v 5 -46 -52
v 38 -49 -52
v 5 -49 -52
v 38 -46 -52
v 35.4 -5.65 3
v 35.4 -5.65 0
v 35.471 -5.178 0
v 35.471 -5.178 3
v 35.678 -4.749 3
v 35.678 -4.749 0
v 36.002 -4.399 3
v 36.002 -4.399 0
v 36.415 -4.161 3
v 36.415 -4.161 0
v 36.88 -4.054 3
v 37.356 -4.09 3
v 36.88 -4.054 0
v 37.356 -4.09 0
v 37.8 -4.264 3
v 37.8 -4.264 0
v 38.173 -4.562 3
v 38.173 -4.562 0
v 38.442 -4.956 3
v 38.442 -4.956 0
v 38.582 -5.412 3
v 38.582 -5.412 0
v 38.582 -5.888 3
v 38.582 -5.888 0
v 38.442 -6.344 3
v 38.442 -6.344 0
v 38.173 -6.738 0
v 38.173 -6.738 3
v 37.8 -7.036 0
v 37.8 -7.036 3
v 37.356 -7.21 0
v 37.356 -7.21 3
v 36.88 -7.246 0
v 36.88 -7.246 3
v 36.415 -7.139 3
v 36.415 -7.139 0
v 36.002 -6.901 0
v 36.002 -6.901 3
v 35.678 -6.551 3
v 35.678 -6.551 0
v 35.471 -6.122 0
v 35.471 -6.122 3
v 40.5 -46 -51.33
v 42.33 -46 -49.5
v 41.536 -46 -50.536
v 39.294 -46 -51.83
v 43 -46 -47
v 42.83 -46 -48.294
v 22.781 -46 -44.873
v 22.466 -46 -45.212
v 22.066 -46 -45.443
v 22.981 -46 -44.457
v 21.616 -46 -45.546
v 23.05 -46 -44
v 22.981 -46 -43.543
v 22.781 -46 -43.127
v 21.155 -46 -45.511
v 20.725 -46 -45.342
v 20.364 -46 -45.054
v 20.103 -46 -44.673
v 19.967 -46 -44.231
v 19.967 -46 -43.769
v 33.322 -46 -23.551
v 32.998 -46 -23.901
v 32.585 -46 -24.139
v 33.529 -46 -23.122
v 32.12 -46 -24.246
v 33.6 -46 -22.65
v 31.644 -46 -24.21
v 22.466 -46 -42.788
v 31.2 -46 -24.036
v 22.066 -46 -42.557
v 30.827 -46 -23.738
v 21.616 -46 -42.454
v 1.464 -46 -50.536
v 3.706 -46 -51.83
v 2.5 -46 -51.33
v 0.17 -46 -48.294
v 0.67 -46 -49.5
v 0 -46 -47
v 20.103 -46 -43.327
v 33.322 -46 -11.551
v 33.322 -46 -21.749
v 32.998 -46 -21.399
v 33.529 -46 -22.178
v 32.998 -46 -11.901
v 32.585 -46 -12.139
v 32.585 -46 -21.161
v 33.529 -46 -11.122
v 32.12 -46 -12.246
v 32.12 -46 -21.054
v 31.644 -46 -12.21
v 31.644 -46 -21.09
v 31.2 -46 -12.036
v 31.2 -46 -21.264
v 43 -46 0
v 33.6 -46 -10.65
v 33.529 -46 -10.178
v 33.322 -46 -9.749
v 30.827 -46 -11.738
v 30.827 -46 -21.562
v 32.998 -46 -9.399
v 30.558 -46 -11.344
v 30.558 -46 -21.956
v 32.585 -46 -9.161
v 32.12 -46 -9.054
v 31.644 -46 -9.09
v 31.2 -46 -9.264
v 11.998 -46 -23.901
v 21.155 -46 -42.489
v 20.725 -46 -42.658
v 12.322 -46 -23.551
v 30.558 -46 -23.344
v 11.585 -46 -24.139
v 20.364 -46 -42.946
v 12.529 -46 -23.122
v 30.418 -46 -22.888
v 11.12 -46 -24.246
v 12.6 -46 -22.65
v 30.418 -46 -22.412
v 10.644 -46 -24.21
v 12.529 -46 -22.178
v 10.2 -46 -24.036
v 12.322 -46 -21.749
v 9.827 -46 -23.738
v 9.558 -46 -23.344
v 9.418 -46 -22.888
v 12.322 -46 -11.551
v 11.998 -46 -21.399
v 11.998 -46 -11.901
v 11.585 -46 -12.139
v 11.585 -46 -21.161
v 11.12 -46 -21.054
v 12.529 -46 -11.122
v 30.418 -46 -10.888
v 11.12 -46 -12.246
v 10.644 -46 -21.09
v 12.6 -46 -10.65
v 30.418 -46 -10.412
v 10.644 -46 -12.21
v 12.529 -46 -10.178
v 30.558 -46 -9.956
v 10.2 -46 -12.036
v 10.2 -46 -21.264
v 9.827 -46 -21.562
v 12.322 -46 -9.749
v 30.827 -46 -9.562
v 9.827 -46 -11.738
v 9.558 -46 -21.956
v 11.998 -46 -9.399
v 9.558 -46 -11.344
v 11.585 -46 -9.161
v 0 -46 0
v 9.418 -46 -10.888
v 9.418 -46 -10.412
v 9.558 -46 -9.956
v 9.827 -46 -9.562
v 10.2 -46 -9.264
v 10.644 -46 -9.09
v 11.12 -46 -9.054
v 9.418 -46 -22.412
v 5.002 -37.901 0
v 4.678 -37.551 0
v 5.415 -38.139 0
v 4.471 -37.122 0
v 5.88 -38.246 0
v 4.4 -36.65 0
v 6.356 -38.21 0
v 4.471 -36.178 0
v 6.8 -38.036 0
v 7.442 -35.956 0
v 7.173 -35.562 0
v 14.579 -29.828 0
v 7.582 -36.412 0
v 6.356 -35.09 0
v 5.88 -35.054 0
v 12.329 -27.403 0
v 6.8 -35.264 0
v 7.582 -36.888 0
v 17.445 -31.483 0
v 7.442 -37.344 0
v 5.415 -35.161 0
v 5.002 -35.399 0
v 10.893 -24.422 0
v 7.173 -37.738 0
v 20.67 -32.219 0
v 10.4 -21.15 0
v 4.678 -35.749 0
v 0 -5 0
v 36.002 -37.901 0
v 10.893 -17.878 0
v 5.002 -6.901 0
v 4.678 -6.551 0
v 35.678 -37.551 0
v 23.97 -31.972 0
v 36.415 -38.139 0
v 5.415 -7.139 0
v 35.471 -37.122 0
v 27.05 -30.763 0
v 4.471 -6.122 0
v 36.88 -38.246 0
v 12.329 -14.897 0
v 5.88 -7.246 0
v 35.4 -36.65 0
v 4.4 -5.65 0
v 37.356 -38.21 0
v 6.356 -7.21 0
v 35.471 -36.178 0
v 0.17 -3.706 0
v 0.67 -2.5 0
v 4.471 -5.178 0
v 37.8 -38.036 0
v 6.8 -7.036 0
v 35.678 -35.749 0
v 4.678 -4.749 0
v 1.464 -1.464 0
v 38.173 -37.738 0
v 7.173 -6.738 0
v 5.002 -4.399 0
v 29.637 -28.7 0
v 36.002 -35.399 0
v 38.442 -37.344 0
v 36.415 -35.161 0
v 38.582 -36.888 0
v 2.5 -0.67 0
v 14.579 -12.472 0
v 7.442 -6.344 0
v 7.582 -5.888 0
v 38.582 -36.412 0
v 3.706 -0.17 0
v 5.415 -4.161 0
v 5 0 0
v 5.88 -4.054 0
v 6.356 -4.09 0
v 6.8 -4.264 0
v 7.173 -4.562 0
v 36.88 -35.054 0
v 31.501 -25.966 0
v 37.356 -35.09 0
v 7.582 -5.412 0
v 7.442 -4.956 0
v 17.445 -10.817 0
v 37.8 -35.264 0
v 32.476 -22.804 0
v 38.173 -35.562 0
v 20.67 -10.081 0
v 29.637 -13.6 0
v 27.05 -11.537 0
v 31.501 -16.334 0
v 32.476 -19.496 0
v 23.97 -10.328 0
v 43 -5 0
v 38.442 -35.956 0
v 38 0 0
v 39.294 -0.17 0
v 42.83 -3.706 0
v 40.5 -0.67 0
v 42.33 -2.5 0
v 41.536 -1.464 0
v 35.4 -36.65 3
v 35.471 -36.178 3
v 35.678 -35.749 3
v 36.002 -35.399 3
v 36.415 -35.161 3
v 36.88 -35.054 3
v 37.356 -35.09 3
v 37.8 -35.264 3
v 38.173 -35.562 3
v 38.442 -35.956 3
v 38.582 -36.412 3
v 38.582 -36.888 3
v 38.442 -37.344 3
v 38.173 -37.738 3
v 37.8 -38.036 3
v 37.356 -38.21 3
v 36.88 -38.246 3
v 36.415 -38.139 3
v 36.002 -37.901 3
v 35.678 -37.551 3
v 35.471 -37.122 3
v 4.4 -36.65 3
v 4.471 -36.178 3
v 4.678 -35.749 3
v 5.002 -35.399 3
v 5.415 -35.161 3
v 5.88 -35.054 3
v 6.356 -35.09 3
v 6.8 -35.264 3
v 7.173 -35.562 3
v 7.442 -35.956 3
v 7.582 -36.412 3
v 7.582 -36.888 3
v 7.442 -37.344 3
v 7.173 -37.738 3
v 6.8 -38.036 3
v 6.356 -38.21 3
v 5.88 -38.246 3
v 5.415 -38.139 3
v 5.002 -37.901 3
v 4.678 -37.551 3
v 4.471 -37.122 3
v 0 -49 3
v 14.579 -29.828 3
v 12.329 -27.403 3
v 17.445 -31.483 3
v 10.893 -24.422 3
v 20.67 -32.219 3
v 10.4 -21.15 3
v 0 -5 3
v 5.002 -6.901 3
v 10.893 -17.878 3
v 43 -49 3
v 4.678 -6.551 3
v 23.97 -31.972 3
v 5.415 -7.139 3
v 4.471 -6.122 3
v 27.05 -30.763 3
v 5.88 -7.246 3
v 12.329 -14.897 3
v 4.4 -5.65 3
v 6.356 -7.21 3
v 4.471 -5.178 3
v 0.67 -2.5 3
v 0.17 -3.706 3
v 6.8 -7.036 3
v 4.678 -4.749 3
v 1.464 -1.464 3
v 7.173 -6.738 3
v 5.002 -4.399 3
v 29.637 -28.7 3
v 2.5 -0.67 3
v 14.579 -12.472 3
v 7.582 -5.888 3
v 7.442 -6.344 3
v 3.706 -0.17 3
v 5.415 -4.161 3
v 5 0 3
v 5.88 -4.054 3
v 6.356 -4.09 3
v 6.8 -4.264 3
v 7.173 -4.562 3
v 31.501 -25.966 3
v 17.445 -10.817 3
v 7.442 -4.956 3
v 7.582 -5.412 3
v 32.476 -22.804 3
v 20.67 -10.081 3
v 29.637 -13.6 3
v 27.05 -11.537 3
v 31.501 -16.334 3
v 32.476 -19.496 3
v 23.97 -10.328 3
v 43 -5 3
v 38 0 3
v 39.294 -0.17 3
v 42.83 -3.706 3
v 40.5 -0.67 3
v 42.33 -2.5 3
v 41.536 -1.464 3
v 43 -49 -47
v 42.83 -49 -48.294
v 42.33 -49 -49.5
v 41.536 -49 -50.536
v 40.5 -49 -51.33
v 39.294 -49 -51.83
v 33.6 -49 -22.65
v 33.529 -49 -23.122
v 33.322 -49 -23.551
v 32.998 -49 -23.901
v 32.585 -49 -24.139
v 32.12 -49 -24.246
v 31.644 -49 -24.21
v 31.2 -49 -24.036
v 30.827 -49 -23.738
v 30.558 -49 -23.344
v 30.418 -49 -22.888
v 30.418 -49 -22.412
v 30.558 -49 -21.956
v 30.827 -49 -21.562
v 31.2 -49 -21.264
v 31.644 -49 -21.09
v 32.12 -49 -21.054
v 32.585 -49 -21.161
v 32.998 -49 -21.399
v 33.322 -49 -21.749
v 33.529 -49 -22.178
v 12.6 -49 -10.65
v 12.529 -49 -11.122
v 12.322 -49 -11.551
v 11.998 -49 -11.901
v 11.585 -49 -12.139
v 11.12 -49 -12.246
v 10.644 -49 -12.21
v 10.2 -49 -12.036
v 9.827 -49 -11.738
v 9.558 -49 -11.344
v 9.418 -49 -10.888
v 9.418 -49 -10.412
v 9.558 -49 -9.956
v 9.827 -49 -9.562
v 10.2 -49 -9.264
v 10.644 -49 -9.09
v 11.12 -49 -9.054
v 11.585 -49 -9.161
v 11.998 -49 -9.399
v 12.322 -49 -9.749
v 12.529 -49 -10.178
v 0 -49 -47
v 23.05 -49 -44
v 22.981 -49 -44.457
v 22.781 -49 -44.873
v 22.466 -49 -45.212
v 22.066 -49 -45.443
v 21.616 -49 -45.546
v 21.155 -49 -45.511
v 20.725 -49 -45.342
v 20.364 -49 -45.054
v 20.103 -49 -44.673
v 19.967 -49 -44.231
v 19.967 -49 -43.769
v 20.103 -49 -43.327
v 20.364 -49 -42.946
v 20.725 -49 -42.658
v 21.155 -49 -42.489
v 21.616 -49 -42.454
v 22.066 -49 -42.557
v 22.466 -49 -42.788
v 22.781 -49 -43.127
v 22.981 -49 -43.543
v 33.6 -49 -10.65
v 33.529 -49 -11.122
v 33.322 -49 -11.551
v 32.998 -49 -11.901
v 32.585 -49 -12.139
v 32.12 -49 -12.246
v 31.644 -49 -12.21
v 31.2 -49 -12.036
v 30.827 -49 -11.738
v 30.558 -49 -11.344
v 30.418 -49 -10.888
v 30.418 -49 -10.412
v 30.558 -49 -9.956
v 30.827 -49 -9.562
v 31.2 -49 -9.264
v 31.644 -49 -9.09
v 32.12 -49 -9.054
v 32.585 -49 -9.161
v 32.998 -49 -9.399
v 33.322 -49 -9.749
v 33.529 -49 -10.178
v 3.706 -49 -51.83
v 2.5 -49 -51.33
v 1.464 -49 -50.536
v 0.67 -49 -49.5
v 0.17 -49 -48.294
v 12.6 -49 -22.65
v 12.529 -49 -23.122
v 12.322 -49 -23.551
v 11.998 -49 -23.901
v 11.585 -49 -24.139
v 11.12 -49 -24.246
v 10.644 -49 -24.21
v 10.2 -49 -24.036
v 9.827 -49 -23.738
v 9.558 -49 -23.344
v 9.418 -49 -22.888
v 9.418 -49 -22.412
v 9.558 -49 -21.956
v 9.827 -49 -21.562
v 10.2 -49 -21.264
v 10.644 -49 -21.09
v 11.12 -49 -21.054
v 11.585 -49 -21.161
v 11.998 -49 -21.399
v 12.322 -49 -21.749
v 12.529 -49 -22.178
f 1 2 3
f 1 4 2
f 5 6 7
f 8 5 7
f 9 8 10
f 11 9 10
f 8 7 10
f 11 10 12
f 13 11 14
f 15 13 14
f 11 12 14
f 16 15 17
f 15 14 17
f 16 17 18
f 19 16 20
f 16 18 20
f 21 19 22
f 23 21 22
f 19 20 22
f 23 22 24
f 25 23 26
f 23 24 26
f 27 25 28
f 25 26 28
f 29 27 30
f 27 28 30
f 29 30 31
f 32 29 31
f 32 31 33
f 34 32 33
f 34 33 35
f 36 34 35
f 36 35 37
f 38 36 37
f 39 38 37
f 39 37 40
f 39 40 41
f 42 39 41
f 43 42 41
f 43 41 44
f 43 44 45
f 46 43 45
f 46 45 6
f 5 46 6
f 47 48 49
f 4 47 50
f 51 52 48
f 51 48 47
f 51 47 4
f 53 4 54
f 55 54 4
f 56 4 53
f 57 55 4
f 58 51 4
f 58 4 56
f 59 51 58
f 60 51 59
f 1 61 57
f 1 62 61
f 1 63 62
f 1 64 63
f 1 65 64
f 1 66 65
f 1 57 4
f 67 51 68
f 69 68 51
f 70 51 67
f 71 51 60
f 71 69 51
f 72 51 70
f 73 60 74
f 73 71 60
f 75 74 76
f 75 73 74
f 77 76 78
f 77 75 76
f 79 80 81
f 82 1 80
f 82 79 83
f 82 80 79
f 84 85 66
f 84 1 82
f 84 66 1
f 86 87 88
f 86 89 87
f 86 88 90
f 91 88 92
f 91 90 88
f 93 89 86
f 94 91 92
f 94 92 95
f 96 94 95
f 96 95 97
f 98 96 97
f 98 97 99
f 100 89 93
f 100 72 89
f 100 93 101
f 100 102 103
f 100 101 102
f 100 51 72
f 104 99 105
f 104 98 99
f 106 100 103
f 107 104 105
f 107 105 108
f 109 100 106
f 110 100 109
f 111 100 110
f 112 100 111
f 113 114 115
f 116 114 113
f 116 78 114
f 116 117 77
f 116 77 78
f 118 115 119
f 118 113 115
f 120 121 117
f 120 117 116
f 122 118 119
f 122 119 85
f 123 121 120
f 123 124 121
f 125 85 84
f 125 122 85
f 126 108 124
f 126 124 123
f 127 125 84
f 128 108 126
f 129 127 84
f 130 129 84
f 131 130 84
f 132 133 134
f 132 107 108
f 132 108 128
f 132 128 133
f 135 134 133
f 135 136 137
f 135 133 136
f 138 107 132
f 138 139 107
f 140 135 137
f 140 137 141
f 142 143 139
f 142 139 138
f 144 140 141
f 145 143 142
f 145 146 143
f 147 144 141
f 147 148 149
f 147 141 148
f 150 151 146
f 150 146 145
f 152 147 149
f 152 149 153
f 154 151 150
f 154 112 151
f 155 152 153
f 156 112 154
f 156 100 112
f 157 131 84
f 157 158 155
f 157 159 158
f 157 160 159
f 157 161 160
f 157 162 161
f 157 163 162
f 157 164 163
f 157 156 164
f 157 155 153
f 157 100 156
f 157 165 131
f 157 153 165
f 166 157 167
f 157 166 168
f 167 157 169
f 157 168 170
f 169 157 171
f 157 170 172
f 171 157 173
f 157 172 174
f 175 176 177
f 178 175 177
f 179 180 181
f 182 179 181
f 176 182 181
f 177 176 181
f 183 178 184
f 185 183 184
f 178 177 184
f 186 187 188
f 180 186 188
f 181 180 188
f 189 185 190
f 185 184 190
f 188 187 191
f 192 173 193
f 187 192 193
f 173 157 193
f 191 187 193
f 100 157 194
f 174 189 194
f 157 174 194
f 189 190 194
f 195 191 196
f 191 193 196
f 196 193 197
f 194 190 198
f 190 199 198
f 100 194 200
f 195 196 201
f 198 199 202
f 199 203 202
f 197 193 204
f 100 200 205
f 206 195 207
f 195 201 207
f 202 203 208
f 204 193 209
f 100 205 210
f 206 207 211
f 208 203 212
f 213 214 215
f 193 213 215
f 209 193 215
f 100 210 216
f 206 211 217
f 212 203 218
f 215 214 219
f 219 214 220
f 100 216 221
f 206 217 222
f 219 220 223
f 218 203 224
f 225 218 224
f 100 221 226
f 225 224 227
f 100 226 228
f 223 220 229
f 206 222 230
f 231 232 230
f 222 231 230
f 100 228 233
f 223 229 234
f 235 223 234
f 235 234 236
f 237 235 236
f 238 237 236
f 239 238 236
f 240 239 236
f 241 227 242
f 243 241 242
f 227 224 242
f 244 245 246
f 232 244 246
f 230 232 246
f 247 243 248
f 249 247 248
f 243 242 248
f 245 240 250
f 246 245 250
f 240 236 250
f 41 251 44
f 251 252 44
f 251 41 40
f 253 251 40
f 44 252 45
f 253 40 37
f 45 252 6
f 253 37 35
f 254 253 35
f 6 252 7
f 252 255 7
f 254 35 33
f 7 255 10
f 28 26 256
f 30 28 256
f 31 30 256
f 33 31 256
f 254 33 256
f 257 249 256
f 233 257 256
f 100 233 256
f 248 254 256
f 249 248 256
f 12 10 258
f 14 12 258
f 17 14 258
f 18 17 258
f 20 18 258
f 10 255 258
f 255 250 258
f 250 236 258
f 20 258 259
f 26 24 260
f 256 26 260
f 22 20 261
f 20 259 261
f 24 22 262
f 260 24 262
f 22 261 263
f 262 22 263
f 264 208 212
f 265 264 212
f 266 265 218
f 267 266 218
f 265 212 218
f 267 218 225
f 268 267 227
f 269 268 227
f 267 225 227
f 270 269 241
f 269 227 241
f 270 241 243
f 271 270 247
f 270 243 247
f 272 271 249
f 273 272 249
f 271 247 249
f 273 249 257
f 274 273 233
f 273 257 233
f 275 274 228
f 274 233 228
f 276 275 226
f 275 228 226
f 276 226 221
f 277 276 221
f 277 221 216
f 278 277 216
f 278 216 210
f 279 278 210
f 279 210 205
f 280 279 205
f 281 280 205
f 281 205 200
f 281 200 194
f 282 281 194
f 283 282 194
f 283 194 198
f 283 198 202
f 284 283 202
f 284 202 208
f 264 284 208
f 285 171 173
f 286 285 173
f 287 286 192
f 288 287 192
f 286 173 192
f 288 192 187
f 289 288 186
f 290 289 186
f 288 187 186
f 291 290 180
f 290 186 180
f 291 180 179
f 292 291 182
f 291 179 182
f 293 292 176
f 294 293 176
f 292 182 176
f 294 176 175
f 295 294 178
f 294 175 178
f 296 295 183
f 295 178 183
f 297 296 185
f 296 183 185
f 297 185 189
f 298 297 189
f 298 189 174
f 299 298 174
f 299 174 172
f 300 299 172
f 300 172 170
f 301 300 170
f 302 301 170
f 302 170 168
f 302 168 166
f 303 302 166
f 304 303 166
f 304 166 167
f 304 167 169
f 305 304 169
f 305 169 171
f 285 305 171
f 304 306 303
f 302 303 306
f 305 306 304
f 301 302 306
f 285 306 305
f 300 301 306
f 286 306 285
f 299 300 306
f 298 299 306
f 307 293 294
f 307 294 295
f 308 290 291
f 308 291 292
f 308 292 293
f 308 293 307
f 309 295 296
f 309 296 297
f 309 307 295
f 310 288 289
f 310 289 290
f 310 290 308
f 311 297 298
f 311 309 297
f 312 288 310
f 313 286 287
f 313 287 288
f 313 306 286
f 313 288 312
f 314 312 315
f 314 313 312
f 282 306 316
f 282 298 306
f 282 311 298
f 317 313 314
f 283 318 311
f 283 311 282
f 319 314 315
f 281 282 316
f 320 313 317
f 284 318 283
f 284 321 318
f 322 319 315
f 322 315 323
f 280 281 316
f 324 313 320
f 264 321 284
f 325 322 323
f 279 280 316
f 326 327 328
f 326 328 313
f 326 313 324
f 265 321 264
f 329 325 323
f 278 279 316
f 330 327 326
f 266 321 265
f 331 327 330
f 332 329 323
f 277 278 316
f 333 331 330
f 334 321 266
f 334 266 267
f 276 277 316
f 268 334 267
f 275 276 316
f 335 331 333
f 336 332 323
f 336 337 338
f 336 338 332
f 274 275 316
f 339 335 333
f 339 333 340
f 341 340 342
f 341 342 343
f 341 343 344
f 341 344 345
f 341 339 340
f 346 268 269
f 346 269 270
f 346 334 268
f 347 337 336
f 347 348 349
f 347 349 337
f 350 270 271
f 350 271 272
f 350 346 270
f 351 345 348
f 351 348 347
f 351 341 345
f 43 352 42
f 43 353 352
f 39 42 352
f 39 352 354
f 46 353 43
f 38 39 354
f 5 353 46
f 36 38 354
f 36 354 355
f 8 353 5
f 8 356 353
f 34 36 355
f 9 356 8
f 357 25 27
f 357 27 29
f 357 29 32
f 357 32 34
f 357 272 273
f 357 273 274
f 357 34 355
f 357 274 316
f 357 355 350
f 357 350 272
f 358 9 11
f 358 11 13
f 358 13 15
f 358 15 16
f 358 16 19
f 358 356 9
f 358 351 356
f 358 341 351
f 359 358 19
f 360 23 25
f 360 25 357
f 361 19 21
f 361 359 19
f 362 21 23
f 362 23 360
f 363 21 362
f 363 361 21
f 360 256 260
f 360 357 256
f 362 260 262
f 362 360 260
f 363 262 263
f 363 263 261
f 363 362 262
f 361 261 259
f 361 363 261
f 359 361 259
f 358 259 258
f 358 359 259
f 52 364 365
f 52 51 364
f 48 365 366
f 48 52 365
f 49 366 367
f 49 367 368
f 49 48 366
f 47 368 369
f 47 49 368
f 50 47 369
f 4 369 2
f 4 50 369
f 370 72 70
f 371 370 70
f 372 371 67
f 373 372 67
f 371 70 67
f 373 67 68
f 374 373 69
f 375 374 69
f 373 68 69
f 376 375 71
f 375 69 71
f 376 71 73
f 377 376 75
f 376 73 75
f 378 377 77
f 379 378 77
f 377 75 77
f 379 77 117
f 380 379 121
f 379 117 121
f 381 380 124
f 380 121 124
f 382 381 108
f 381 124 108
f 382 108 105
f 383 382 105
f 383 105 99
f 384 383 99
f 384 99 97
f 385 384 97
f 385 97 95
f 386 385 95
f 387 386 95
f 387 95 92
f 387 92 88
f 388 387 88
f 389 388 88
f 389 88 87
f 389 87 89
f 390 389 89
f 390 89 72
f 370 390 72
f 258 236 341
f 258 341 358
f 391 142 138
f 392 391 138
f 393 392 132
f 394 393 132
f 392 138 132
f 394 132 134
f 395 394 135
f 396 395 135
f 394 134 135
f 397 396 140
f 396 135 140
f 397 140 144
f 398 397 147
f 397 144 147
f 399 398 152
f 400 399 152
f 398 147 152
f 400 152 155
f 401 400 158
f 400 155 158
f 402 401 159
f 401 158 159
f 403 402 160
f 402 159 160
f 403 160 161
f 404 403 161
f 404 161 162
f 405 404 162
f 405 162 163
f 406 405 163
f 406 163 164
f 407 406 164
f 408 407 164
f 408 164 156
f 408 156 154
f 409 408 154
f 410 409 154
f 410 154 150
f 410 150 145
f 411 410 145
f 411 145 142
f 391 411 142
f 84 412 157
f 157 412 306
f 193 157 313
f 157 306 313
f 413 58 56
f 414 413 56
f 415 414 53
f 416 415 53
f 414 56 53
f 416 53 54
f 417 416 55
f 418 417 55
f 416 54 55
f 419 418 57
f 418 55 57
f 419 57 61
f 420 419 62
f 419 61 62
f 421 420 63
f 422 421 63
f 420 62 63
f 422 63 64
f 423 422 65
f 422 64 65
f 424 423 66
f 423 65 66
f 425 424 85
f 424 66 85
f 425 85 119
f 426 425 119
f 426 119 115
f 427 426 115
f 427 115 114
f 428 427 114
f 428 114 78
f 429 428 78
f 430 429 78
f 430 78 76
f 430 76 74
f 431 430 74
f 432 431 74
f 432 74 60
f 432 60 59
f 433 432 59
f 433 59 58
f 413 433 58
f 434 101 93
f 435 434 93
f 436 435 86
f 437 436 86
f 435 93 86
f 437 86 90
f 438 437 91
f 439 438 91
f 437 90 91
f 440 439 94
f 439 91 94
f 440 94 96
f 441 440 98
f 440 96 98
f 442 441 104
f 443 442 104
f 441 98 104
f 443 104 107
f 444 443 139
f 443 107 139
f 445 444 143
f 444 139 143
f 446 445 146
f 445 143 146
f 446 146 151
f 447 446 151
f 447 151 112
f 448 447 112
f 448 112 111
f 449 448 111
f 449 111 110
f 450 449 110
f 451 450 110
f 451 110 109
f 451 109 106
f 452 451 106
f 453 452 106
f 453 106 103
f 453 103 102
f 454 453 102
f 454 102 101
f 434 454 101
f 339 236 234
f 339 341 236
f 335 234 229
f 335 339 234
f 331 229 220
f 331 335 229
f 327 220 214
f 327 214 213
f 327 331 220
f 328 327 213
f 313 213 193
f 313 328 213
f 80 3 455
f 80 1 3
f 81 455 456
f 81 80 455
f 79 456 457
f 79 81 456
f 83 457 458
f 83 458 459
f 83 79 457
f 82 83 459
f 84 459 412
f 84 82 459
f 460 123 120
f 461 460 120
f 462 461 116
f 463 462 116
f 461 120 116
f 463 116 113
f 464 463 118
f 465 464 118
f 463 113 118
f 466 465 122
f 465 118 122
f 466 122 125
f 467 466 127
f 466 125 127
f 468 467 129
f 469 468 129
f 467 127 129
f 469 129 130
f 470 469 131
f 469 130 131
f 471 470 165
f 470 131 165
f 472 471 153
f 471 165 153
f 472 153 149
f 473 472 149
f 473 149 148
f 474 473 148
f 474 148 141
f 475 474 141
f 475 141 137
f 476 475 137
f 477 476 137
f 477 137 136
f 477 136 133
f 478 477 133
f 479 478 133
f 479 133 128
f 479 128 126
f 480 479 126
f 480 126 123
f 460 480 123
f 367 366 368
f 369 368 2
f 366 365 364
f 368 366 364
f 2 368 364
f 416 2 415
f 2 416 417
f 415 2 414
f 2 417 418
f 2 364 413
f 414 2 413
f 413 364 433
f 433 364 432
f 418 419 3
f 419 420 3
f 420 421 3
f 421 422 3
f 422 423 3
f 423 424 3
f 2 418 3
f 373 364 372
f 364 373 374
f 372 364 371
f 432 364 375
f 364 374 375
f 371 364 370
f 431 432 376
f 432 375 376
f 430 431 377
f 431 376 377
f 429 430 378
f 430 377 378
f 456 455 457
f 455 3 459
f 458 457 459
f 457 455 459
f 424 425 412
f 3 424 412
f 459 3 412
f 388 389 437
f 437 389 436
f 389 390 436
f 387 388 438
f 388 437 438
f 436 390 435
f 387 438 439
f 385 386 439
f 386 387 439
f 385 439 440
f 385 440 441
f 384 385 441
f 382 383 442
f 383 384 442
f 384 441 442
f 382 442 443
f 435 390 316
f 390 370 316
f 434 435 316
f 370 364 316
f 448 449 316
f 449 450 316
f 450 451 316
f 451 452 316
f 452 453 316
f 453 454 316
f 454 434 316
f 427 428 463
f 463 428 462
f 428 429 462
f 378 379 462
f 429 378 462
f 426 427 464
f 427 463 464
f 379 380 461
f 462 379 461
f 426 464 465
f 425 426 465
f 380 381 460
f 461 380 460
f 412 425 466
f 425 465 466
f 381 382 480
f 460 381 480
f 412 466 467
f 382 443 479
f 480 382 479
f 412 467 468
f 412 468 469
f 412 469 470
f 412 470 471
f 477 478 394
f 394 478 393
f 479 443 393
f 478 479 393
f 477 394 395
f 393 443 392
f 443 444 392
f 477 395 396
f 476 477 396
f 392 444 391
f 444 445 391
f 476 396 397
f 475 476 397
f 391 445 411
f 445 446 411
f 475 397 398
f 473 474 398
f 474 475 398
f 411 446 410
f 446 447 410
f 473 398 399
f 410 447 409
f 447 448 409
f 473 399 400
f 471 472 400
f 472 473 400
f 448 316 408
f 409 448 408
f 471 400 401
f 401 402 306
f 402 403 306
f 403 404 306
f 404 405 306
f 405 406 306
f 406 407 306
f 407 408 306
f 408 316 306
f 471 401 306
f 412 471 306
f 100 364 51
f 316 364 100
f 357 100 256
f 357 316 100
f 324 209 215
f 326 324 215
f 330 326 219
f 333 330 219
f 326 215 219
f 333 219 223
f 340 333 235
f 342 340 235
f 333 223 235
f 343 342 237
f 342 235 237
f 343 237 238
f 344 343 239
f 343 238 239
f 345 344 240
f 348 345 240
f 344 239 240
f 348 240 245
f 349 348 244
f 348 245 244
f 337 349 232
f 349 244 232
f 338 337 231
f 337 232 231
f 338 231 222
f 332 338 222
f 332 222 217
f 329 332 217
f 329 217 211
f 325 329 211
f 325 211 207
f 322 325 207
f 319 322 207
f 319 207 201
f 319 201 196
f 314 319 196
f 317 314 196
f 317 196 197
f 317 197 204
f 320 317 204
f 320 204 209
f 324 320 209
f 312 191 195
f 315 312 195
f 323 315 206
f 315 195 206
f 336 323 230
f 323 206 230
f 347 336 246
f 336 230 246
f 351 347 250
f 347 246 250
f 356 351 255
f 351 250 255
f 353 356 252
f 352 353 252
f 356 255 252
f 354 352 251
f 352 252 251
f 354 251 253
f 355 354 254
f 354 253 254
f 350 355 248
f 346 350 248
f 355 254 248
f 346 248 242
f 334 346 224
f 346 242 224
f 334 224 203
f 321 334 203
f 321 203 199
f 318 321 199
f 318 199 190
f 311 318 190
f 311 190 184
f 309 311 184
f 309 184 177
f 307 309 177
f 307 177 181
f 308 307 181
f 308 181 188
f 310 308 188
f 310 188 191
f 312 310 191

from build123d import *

# Parameters (mm, degrees)
SKETCH_3_W          = 43
SKETCH_3_H          = 49
EXTRUDE_2_DEPTH     = 3
SKETCH_6_R          = 11.1
SKETCH_6_R_2        = 1.6
CUT_EXTRUDE_2_DEPTH = 45
SKETCH_7_W          = 43
SKETCH_7_H          = 3
EXTRUDE_4_DEPTH     = 52
SKETCH_8_R          = 1.6
SKETCH_8_R_2        = 1.55
CUT_EXTRUDE_3_DEPTH = 45
FILLET_1_R          = 5


with BuildPart() as part:
    # 草图3 → 凸台-拉伸2 (new body)
    with BuildSketch(Plane.XY):
        with Locations((21.5, -24.5)):
            Rectangle(SKETCH_3_W, SKETCH_3_H)
    extrude(amount=EXTRUDE_2_DEPTH)

    # 草图6 → 切除-拉伸2 (cut)
    with BuildSketch(Plane(origin=(0, 0, 0), x_dir=(-1, 0, 0), z_dir=(0, 0, -1))):
        with Locations((-21.5, -21.15)):
            Circle(SKETCH_6_R)
        with Locations((-37, -5.65)):
            Circle(SKETCH_6_R_2)
        with Locations((-6, -5.65)):
            Circle(SKETCH_6_R_2)
        with Locations((-6, -36.65)):
            Circle(SKETCH_6_R_2)
        with Locations((-37, -36.65)):
            Circle(SKETCH_6_R_2)
    extrude(amount=-CUT_EXTRUDE_2_DEPTH, mode=Mode.SUBTRACT)

    # 草图7 → 凸台-拉伸4 (add)
    with BuildSketch(Plane(origin=(0, 0, 0), x_dir=(-1, 0, 0), z_dir=(0, 0, -1))):
        with Locations((-21.5, -47.5)):
            Rectangle(SKETCH_7_W, SKETCH_7_H)
    extrude(amount=EXTRUDE_4_DEPTH)

    # 草图8 → 切除-拉伸3 (cut)
    with BuildSketch(Plane(origin=(0, -46, 0), x_dir=(1, 0, 0), z_dir=(0, 1, 0))):
        with Locations((11, 10.65)):
            Circle(SKETCH_8_R)
        with Locations((11, 22.65)):
            Circle(SKETCH_8_R)
        with Locations((32, 10.65)):
            Circle(SKETCH_8_R)
        with Locations((32, 22.65)):
            Circle(SKETCH_8_R)
        with Locations((21.5, 44)):
            Circle(SKETCH_8_R_2)
    extrude(amount=-CUT_EXTRUDE_3_DEPTH, mode=Mode.SUBTRACT)

    # 圆角1
    fillet_1_edges = [part.edges().sort_by_distance(p)[0] for p in [
        (43, -47.5, -52),
        (0, -47.5, -52),
        (0, 0, 1.5),
        (43, 0, 1.5),
    ]]
    fillet(fillet_1_edges, radius=FILLET_1_R)


solid = part.part
